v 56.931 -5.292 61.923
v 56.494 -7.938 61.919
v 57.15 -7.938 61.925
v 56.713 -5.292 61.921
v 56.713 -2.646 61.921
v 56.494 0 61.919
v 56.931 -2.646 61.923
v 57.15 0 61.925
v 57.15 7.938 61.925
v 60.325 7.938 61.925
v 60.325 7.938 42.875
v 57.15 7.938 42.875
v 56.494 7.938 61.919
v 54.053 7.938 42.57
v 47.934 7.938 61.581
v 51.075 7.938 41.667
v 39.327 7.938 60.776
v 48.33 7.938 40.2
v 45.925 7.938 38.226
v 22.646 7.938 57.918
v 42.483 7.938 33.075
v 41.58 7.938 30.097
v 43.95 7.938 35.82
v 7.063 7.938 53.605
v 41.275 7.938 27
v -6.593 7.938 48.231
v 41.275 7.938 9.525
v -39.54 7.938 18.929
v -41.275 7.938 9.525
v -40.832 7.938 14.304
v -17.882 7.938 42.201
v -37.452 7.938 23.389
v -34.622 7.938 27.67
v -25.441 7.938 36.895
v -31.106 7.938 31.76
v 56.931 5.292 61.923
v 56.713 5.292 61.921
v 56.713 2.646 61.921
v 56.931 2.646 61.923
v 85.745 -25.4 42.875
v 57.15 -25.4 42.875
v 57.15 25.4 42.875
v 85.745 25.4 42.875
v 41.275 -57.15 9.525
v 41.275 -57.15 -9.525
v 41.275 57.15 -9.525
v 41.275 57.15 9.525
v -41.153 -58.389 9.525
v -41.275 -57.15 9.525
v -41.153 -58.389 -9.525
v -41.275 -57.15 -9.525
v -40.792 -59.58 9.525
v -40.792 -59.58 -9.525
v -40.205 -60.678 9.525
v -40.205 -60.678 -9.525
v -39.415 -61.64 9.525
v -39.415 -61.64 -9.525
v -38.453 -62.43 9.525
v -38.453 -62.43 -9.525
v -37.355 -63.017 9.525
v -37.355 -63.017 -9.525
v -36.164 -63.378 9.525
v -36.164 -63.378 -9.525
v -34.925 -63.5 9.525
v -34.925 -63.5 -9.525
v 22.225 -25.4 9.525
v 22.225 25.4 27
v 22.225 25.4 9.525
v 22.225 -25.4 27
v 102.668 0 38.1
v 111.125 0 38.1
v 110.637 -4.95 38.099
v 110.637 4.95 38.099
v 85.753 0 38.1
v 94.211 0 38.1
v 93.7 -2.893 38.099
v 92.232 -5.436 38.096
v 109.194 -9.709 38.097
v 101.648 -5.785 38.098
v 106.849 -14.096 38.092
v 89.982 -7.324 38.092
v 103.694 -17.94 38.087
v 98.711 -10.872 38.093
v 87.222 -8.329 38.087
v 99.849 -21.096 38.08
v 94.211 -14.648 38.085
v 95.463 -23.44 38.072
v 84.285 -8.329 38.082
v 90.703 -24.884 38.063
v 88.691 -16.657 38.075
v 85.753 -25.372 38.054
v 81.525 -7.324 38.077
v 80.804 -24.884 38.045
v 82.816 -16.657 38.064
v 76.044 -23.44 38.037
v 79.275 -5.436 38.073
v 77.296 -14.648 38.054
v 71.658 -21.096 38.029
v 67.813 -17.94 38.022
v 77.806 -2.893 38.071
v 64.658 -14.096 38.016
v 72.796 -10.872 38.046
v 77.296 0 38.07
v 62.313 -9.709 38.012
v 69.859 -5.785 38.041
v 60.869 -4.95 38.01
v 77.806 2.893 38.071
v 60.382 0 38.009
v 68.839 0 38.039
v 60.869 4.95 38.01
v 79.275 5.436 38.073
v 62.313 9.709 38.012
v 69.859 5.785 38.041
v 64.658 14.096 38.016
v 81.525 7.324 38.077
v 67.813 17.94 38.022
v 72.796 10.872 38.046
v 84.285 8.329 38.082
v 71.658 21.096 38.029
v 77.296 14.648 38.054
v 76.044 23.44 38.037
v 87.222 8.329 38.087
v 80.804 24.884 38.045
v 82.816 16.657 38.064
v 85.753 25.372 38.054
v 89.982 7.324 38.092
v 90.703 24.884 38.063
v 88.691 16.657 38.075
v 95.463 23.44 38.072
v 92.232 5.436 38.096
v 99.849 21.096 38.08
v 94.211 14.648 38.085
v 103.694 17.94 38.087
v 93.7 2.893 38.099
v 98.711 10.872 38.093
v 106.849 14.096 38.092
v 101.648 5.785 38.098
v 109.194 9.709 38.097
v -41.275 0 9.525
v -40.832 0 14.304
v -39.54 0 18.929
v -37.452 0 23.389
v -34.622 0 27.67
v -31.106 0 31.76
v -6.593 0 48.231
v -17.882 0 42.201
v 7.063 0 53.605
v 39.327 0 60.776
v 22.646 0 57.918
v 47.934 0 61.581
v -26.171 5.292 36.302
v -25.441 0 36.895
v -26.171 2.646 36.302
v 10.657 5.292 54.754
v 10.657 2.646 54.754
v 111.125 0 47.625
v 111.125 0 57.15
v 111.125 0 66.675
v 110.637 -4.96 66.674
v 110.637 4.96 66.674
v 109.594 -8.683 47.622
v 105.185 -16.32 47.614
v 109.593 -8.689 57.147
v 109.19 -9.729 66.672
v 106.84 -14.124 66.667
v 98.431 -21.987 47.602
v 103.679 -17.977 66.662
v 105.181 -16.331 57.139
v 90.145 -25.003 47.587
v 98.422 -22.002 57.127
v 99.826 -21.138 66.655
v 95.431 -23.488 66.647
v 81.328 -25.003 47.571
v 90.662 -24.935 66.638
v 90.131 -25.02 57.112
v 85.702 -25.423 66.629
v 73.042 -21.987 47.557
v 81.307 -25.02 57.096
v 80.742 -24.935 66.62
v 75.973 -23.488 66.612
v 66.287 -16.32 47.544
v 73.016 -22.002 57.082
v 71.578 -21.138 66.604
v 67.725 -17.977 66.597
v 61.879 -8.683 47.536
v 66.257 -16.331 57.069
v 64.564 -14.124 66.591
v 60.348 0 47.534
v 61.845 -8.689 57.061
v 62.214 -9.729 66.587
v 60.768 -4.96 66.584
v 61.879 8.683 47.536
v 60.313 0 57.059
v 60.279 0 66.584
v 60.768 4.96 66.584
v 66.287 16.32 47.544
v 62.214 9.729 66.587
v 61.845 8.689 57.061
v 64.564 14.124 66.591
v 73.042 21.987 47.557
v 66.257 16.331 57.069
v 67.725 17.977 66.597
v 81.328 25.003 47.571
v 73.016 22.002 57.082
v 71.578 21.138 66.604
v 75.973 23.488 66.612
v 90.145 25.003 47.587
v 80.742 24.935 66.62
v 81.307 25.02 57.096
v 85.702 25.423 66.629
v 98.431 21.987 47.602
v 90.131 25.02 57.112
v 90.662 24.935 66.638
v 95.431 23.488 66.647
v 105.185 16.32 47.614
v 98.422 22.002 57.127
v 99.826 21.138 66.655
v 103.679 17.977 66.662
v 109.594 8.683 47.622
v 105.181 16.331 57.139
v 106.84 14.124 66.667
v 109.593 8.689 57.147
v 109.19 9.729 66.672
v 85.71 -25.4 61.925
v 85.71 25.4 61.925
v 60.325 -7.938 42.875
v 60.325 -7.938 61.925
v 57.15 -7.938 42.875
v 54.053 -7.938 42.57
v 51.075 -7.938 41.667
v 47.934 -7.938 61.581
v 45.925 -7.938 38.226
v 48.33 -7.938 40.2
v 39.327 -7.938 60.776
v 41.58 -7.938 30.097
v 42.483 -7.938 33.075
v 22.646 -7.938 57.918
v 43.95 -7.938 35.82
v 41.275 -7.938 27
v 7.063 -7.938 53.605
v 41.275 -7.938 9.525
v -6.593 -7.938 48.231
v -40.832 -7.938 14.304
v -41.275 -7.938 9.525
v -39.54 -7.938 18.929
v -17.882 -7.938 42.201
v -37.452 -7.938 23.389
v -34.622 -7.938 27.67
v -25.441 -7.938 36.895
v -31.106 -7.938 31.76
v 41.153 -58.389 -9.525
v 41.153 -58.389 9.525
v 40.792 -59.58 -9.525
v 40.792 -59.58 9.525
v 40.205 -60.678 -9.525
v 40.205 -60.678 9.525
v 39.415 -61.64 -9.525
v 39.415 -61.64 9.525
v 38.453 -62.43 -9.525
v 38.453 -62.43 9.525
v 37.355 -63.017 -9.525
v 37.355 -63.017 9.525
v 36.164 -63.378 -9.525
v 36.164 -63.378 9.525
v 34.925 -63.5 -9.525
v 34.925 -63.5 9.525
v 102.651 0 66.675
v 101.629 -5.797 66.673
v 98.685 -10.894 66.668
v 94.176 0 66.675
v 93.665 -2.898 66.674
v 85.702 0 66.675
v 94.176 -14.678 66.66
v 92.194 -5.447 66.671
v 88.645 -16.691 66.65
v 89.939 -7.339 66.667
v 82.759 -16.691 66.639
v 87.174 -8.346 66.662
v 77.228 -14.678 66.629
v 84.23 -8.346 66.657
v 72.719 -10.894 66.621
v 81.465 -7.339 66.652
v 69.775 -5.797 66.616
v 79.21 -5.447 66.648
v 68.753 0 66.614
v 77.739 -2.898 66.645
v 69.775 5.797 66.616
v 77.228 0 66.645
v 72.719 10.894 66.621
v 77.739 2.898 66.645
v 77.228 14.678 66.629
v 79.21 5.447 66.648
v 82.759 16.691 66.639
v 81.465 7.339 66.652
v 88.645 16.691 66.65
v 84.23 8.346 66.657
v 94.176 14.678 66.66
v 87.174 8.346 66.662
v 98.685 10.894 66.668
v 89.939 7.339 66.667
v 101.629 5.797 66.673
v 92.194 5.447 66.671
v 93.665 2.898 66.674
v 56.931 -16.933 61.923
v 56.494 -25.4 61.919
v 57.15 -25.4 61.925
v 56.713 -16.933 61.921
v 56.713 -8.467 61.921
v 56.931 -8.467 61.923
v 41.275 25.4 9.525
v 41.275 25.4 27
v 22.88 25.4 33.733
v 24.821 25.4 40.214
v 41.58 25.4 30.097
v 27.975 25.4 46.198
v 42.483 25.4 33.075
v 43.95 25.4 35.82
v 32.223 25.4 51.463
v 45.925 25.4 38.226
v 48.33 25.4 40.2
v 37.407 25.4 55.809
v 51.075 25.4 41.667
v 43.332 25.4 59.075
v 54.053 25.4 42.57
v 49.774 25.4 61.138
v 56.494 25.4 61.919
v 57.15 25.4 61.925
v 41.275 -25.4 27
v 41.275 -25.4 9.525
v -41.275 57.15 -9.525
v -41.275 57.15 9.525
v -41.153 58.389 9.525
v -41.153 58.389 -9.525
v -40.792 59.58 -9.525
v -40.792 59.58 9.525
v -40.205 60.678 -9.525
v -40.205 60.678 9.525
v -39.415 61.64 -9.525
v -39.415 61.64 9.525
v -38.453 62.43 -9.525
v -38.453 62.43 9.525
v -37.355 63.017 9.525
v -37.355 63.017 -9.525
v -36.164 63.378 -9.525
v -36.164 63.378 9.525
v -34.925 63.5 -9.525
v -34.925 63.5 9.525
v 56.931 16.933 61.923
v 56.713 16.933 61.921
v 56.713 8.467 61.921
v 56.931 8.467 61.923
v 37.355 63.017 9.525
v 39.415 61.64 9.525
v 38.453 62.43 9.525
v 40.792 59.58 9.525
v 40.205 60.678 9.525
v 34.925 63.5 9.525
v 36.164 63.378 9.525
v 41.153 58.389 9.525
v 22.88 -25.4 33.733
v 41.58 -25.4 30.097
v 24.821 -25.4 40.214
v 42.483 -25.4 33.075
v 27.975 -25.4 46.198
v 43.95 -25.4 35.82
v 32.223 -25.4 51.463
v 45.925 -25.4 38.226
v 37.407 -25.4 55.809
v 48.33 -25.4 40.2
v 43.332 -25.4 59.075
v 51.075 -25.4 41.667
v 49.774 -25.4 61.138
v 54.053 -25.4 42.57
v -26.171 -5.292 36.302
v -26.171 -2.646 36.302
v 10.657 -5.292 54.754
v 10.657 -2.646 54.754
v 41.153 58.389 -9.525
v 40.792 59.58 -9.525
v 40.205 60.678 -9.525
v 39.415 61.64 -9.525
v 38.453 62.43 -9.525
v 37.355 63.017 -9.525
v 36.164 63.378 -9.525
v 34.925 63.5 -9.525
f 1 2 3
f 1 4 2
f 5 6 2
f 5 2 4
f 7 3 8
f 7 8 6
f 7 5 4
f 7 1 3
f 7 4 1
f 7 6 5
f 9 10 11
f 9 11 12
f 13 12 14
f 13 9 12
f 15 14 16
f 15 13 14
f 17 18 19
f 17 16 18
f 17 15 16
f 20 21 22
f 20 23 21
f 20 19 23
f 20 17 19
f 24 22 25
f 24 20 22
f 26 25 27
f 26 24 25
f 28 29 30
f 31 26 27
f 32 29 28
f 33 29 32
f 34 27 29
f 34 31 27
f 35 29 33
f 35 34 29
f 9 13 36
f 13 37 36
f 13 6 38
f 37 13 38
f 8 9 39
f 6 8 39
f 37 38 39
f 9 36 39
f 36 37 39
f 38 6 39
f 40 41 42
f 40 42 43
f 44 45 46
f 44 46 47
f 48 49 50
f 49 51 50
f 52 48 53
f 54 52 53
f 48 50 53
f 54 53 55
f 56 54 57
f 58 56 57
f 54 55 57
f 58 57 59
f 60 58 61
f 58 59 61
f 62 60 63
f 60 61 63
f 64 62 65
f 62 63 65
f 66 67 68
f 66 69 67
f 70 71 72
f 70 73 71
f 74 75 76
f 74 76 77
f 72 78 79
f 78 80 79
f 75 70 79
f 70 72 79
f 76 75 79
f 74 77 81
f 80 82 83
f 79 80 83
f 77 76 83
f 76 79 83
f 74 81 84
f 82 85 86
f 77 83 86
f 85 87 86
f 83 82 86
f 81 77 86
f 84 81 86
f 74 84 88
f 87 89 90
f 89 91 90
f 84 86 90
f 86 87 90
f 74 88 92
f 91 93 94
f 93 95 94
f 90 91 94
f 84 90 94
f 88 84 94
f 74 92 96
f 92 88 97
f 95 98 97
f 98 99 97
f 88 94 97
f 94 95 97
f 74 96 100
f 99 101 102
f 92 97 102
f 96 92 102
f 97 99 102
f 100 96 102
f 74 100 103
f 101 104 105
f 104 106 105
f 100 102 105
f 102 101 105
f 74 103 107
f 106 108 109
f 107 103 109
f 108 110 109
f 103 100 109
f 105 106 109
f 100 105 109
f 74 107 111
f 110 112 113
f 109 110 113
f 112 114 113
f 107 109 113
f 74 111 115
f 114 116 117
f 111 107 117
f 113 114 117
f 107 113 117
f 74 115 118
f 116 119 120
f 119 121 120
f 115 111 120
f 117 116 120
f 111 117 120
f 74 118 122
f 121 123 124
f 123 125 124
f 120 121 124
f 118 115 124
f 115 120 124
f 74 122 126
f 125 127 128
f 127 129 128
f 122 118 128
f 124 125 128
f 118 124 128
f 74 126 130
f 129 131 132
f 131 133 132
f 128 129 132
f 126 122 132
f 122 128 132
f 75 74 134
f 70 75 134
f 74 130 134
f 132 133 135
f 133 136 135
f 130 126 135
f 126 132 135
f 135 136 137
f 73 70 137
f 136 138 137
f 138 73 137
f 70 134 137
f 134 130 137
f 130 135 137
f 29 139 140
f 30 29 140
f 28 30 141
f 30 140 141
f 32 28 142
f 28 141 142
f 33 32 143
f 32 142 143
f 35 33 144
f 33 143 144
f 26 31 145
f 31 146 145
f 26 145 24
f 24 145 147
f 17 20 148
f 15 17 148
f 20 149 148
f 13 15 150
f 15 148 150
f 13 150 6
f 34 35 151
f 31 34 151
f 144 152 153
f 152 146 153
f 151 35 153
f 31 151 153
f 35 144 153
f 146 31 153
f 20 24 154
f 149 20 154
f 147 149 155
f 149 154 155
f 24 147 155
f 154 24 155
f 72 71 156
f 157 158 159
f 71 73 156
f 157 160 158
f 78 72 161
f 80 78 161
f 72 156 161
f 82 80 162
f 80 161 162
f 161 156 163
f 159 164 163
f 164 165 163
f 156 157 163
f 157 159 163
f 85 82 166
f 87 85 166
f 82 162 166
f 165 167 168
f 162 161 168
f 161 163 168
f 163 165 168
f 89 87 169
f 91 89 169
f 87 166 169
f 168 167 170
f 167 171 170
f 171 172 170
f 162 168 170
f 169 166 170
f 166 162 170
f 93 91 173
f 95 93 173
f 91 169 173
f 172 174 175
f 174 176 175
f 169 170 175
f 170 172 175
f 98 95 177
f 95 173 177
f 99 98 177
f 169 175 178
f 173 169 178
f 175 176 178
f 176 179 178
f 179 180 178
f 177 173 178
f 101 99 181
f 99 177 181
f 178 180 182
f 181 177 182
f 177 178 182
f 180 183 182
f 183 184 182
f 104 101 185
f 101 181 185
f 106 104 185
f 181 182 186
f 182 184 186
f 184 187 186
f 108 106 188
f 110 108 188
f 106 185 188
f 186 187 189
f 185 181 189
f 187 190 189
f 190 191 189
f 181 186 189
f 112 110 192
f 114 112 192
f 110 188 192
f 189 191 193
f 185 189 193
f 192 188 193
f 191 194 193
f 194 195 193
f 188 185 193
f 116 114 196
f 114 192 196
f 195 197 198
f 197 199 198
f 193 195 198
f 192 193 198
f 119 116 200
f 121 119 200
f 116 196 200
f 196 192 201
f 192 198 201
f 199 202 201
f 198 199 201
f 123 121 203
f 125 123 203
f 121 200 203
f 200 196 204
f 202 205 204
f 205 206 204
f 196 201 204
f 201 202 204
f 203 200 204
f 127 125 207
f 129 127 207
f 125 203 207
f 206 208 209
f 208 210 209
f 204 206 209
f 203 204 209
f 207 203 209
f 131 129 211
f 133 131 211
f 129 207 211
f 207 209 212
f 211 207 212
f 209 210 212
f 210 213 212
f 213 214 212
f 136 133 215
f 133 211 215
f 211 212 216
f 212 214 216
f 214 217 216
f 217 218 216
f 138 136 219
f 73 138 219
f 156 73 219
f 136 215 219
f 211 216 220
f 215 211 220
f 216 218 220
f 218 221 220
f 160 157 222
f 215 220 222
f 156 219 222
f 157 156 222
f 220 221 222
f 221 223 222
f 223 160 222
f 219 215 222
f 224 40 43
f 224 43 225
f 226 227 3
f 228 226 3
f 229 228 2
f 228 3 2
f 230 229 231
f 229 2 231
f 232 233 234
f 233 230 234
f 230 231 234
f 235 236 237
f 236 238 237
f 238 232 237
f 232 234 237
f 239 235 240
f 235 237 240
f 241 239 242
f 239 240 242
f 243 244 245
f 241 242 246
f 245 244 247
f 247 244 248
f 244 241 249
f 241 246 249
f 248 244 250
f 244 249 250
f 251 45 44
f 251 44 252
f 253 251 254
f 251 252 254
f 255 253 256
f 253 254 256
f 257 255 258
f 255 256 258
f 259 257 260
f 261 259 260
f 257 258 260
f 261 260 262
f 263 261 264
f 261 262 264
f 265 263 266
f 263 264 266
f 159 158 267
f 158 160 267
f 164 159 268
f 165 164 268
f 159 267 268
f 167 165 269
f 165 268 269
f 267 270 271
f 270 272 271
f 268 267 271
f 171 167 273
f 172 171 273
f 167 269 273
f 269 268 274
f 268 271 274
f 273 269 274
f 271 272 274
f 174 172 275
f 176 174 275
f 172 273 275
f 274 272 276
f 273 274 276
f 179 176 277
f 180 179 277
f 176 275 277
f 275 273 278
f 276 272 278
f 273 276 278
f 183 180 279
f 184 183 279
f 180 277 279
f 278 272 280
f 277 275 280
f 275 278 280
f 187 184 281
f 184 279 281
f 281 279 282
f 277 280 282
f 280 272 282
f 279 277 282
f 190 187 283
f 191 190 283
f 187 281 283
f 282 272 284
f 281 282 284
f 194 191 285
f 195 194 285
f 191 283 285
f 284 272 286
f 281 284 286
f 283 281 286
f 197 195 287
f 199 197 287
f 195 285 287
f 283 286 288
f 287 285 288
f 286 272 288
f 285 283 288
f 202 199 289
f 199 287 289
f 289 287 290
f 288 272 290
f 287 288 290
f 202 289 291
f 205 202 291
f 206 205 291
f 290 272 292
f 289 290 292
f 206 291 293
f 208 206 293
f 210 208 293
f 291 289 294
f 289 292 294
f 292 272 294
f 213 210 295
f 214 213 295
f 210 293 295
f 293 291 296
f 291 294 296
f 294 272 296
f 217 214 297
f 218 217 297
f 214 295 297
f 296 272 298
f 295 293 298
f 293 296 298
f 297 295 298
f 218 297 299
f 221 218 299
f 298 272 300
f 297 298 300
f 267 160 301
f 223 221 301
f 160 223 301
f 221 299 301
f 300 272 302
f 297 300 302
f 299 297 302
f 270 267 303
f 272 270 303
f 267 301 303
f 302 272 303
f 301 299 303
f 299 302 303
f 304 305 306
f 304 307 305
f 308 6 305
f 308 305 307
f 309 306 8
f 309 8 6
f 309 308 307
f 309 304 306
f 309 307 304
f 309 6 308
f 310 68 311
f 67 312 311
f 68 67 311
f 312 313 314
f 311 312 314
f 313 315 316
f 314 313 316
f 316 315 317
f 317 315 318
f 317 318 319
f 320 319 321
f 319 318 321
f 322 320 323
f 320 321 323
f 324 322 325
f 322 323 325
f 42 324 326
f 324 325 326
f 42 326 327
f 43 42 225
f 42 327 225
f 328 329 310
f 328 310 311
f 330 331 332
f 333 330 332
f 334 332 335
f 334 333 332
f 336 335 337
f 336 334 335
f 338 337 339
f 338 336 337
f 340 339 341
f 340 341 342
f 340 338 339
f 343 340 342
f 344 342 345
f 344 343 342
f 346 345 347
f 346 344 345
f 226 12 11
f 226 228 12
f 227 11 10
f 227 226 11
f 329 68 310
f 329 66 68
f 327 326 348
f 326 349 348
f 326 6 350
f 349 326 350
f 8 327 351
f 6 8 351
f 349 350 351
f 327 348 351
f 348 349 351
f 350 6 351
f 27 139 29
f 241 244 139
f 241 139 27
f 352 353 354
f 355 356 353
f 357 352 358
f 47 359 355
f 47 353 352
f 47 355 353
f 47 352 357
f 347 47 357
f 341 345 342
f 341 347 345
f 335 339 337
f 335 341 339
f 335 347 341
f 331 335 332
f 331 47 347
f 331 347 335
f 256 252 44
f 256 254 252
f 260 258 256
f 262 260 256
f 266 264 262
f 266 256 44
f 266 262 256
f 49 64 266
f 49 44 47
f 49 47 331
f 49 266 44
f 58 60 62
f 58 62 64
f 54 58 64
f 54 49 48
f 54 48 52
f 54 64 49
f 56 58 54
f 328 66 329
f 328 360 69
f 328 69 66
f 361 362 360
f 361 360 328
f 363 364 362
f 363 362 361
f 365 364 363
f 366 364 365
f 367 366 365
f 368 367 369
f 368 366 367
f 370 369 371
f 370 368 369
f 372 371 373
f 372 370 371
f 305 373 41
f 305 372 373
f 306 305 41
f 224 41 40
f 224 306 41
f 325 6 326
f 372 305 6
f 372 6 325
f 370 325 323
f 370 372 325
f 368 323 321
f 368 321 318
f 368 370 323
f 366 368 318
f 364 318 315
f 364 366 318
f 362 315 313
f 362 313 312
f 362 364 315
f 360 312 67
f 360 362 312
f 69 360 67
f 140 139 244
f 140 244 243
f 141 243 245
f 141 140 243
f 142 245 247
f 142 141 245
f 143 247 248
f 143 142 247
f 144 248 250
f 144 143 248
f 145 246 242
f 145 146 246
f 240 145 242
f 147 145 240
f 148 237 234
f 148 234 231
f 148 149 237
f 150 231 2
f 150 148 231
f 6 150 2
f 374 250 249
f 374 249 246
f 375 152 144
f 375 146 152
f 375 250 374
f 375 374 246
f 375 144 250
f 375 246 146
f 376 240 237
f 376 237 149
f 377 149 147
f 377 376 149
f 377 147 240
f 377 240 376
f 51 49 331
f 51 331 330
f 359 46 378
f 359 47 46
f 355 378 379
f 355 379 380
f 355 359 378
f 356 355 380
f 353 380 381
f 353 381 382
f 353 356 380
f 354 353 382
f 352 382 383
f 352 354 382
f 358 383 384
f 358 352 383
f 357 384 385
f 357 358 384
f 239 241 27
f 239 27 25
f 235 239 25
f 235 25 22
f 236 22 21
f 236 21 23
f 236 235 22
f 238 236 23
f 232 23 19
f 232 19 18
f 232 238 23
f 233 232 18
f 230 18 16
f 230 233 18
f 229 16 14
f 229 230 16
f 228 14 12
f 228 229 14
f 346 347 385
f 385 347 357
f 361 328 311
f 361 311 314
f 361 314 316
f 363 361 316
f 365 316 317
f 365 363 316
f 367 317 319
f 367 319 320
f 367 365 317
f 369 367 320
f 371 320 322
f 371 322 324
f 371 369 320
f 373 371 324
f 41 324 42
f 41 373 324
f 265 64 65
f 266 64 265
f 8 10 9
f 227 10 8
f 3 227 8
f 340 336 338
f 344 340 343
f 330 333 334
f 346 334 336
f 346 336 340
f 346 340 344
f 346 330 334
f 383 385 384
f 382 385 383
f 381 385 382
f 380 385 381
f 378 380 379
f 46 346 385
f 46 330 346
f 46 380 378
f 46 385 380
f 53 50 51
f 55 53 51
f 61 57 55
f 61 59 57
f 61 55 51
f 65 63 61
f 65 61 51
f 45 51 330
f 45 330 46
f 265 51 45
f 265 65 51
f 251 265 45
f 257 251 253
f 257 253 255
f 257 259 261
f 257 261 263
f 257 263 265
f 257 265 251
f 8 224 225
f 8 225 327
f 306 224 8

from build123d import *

# Parameters (mm, degrees)
F1_DEPTH = 63.5
F2_DEPTH = 25.4
F3_DEPTH = 7.9375
F5_R     = 6.35


with BuildPart() as f1:
    # F0 (on Front) → F1 (new body, symmetric)
    with BuildSketch(Plane.XZ):
        Polygon((-41.275, 9.525), (-41.275, -9.525), (41.275, -9.525), (41.275, 9.525), (22.225, 9.525), align=None)
    extrude(amount=F1_DEPTH, both=True)

    # F5
    f5_edges = [f1.edges().sort_by_distance(p)[0] for p in [
        (41.275, -63.5, 0),
        (-41.275, -63.5, 0),
        (41.275, 63.5, 0),
        (-41.275, 63.5, 0),
    ]]
    fillet(f5_edges, radius=F5_R)


with BuildPart() as f2:
    # F0 (on Front) → F2 (new body, symmetric)
    with BuildSketch(Plane.XZ):
        with BuildLine():
            Line((22.225, 9.525), (41.275, 9.525))
            Line((41.275, 9.525), (41.275, 27.0002))
            ThreePointArc((41.275, 27.0002), (45.9246798487, 38.2255201513), (57.15, 42.8752))
            Line((57.15, 42.8752), (60.325, 42.8752))
            Line((60.325, 42.8752), (60.325, 61.9252))
            Line((60.325, 61.9252), (57.15, 61.9252))
            add(Edge.make_bspline(
                [(56.4939729044, 61.9190380885), (56.7127760108, 61.9215739664), (56.9314537489, 61.9236284118), (57.15, 61.9252)],
                knots=[110.9778167256, 110.9778167256, 110.9778167256, 110.9778167256, 111.5045361635, 111.5045361635, 111.5045361635, 111.5045361635], degree=3))
            ThreePointArc((56.4939729044, 61.9190380885), (32.2234341383, 51.4628641914), (22.225, 27.0002))
            Line((22.225, 27.0002), (22.225, 9.525))
        make_face()
        Polygon((85.7104724294, 61.9252), (60.325, 61.9252), (60.325, 42.8752), (85.7447144318, 42.8752), align=None)
    extrude(amount=F2_DEPTH, both=True)


with BuildPart() as f3:
    # F0 (on Front) → F3 (new body, symmetric)
    with BuildSketch(Plane.XZ):
        with BuildLine():
            add(Edge.make_bspline(
                [(-41.275, 9.525), (-41.2734856062, 39.4782437782), (10.3929762491, 61.3847380846), (56.4939729044, 61.9190380885)],
                knots=[0, 0, 0, 0, 110.9778167256, 110.9778167256, 110.9778167256, 110.9778167256], degree=3))
            Line((-41.275, 9.525), (22.225, 9.525))
            Line((22.225, 9.525), (22.225, 27.0002))
            ThreePointArc((22.225, 27.0002), (32.2234341383, 51.4628641914), (56.4939729044, 61.9190380885))
        make_face()
        with BuildLine():
            Line((22.225, 9.525), (41.275, 9.525))
            Line((41.275, 9.525), (41.275, 27.0002))
            ThreePointArc((41.275, 27.0002), (45.9246798487, 38.2255201513), (57.15, 42.8752))
            Line((57.15, 42.8752), (60.325, 42.8752))
            Line((60.325, 42.8752), (60.325, 61.9252))
            Line((60.325, 61.9252), (57.15, 61.9252))
            add(Edge.make_bspline(
                [(56.4939729044, 61.9190380885), (56.7127760108, 61.9215739664), (56.9314537489, 61.9236284118), (57.15, 61.9252)],
                knots=[110.9778167256, 110.9778167256, 110.9778167256, 110.9778167256, 111.5045361635, 111.5045361635, 111.5045361635, 111.5045361635], degree=3))
            ThreePointArc((56.4939729044, 61.9190380885), (32.2234341383, 51.4628641914), (22.225, 27.0002))
            Line((22.225, 27.0002), (22.225, 9.525))
        make_face()
    extrude(amount=F3_DEPTH, both=True)


with BuildPart() as f4:
    # F0 (on Front) → F4 (revolve)
    with BuildSketch(Plane.XZ):
        Polygon((85.7019347568, 66.675), (85.7104724294, 61.9252), (94.5120291833, 61.9252), (111.125, 61.9252), (111.125, 66.675), align=None)
        Polygon((94.5120291833, 61.9252), (85.7104724294, 61.9252), (85.7447144318, 42.8752), (85.7532977604, 42.8752), (111.125, 42.8752), (111.125, 61.9252), align=None)
        Polygon((85.7532977604, 42.8752), (85.7447144318, 42.8752), (85.7532977604, 38.1), (111.125, 38.1), (111.125, 42.8752), align=None)
    revolve(axis=Axis((85.7276162586, 0, 52.3875), (0.0017974775, 0, -0.9999983845)))


solid = Compound([f1.part, f2.part, f3.part, f4.part])
